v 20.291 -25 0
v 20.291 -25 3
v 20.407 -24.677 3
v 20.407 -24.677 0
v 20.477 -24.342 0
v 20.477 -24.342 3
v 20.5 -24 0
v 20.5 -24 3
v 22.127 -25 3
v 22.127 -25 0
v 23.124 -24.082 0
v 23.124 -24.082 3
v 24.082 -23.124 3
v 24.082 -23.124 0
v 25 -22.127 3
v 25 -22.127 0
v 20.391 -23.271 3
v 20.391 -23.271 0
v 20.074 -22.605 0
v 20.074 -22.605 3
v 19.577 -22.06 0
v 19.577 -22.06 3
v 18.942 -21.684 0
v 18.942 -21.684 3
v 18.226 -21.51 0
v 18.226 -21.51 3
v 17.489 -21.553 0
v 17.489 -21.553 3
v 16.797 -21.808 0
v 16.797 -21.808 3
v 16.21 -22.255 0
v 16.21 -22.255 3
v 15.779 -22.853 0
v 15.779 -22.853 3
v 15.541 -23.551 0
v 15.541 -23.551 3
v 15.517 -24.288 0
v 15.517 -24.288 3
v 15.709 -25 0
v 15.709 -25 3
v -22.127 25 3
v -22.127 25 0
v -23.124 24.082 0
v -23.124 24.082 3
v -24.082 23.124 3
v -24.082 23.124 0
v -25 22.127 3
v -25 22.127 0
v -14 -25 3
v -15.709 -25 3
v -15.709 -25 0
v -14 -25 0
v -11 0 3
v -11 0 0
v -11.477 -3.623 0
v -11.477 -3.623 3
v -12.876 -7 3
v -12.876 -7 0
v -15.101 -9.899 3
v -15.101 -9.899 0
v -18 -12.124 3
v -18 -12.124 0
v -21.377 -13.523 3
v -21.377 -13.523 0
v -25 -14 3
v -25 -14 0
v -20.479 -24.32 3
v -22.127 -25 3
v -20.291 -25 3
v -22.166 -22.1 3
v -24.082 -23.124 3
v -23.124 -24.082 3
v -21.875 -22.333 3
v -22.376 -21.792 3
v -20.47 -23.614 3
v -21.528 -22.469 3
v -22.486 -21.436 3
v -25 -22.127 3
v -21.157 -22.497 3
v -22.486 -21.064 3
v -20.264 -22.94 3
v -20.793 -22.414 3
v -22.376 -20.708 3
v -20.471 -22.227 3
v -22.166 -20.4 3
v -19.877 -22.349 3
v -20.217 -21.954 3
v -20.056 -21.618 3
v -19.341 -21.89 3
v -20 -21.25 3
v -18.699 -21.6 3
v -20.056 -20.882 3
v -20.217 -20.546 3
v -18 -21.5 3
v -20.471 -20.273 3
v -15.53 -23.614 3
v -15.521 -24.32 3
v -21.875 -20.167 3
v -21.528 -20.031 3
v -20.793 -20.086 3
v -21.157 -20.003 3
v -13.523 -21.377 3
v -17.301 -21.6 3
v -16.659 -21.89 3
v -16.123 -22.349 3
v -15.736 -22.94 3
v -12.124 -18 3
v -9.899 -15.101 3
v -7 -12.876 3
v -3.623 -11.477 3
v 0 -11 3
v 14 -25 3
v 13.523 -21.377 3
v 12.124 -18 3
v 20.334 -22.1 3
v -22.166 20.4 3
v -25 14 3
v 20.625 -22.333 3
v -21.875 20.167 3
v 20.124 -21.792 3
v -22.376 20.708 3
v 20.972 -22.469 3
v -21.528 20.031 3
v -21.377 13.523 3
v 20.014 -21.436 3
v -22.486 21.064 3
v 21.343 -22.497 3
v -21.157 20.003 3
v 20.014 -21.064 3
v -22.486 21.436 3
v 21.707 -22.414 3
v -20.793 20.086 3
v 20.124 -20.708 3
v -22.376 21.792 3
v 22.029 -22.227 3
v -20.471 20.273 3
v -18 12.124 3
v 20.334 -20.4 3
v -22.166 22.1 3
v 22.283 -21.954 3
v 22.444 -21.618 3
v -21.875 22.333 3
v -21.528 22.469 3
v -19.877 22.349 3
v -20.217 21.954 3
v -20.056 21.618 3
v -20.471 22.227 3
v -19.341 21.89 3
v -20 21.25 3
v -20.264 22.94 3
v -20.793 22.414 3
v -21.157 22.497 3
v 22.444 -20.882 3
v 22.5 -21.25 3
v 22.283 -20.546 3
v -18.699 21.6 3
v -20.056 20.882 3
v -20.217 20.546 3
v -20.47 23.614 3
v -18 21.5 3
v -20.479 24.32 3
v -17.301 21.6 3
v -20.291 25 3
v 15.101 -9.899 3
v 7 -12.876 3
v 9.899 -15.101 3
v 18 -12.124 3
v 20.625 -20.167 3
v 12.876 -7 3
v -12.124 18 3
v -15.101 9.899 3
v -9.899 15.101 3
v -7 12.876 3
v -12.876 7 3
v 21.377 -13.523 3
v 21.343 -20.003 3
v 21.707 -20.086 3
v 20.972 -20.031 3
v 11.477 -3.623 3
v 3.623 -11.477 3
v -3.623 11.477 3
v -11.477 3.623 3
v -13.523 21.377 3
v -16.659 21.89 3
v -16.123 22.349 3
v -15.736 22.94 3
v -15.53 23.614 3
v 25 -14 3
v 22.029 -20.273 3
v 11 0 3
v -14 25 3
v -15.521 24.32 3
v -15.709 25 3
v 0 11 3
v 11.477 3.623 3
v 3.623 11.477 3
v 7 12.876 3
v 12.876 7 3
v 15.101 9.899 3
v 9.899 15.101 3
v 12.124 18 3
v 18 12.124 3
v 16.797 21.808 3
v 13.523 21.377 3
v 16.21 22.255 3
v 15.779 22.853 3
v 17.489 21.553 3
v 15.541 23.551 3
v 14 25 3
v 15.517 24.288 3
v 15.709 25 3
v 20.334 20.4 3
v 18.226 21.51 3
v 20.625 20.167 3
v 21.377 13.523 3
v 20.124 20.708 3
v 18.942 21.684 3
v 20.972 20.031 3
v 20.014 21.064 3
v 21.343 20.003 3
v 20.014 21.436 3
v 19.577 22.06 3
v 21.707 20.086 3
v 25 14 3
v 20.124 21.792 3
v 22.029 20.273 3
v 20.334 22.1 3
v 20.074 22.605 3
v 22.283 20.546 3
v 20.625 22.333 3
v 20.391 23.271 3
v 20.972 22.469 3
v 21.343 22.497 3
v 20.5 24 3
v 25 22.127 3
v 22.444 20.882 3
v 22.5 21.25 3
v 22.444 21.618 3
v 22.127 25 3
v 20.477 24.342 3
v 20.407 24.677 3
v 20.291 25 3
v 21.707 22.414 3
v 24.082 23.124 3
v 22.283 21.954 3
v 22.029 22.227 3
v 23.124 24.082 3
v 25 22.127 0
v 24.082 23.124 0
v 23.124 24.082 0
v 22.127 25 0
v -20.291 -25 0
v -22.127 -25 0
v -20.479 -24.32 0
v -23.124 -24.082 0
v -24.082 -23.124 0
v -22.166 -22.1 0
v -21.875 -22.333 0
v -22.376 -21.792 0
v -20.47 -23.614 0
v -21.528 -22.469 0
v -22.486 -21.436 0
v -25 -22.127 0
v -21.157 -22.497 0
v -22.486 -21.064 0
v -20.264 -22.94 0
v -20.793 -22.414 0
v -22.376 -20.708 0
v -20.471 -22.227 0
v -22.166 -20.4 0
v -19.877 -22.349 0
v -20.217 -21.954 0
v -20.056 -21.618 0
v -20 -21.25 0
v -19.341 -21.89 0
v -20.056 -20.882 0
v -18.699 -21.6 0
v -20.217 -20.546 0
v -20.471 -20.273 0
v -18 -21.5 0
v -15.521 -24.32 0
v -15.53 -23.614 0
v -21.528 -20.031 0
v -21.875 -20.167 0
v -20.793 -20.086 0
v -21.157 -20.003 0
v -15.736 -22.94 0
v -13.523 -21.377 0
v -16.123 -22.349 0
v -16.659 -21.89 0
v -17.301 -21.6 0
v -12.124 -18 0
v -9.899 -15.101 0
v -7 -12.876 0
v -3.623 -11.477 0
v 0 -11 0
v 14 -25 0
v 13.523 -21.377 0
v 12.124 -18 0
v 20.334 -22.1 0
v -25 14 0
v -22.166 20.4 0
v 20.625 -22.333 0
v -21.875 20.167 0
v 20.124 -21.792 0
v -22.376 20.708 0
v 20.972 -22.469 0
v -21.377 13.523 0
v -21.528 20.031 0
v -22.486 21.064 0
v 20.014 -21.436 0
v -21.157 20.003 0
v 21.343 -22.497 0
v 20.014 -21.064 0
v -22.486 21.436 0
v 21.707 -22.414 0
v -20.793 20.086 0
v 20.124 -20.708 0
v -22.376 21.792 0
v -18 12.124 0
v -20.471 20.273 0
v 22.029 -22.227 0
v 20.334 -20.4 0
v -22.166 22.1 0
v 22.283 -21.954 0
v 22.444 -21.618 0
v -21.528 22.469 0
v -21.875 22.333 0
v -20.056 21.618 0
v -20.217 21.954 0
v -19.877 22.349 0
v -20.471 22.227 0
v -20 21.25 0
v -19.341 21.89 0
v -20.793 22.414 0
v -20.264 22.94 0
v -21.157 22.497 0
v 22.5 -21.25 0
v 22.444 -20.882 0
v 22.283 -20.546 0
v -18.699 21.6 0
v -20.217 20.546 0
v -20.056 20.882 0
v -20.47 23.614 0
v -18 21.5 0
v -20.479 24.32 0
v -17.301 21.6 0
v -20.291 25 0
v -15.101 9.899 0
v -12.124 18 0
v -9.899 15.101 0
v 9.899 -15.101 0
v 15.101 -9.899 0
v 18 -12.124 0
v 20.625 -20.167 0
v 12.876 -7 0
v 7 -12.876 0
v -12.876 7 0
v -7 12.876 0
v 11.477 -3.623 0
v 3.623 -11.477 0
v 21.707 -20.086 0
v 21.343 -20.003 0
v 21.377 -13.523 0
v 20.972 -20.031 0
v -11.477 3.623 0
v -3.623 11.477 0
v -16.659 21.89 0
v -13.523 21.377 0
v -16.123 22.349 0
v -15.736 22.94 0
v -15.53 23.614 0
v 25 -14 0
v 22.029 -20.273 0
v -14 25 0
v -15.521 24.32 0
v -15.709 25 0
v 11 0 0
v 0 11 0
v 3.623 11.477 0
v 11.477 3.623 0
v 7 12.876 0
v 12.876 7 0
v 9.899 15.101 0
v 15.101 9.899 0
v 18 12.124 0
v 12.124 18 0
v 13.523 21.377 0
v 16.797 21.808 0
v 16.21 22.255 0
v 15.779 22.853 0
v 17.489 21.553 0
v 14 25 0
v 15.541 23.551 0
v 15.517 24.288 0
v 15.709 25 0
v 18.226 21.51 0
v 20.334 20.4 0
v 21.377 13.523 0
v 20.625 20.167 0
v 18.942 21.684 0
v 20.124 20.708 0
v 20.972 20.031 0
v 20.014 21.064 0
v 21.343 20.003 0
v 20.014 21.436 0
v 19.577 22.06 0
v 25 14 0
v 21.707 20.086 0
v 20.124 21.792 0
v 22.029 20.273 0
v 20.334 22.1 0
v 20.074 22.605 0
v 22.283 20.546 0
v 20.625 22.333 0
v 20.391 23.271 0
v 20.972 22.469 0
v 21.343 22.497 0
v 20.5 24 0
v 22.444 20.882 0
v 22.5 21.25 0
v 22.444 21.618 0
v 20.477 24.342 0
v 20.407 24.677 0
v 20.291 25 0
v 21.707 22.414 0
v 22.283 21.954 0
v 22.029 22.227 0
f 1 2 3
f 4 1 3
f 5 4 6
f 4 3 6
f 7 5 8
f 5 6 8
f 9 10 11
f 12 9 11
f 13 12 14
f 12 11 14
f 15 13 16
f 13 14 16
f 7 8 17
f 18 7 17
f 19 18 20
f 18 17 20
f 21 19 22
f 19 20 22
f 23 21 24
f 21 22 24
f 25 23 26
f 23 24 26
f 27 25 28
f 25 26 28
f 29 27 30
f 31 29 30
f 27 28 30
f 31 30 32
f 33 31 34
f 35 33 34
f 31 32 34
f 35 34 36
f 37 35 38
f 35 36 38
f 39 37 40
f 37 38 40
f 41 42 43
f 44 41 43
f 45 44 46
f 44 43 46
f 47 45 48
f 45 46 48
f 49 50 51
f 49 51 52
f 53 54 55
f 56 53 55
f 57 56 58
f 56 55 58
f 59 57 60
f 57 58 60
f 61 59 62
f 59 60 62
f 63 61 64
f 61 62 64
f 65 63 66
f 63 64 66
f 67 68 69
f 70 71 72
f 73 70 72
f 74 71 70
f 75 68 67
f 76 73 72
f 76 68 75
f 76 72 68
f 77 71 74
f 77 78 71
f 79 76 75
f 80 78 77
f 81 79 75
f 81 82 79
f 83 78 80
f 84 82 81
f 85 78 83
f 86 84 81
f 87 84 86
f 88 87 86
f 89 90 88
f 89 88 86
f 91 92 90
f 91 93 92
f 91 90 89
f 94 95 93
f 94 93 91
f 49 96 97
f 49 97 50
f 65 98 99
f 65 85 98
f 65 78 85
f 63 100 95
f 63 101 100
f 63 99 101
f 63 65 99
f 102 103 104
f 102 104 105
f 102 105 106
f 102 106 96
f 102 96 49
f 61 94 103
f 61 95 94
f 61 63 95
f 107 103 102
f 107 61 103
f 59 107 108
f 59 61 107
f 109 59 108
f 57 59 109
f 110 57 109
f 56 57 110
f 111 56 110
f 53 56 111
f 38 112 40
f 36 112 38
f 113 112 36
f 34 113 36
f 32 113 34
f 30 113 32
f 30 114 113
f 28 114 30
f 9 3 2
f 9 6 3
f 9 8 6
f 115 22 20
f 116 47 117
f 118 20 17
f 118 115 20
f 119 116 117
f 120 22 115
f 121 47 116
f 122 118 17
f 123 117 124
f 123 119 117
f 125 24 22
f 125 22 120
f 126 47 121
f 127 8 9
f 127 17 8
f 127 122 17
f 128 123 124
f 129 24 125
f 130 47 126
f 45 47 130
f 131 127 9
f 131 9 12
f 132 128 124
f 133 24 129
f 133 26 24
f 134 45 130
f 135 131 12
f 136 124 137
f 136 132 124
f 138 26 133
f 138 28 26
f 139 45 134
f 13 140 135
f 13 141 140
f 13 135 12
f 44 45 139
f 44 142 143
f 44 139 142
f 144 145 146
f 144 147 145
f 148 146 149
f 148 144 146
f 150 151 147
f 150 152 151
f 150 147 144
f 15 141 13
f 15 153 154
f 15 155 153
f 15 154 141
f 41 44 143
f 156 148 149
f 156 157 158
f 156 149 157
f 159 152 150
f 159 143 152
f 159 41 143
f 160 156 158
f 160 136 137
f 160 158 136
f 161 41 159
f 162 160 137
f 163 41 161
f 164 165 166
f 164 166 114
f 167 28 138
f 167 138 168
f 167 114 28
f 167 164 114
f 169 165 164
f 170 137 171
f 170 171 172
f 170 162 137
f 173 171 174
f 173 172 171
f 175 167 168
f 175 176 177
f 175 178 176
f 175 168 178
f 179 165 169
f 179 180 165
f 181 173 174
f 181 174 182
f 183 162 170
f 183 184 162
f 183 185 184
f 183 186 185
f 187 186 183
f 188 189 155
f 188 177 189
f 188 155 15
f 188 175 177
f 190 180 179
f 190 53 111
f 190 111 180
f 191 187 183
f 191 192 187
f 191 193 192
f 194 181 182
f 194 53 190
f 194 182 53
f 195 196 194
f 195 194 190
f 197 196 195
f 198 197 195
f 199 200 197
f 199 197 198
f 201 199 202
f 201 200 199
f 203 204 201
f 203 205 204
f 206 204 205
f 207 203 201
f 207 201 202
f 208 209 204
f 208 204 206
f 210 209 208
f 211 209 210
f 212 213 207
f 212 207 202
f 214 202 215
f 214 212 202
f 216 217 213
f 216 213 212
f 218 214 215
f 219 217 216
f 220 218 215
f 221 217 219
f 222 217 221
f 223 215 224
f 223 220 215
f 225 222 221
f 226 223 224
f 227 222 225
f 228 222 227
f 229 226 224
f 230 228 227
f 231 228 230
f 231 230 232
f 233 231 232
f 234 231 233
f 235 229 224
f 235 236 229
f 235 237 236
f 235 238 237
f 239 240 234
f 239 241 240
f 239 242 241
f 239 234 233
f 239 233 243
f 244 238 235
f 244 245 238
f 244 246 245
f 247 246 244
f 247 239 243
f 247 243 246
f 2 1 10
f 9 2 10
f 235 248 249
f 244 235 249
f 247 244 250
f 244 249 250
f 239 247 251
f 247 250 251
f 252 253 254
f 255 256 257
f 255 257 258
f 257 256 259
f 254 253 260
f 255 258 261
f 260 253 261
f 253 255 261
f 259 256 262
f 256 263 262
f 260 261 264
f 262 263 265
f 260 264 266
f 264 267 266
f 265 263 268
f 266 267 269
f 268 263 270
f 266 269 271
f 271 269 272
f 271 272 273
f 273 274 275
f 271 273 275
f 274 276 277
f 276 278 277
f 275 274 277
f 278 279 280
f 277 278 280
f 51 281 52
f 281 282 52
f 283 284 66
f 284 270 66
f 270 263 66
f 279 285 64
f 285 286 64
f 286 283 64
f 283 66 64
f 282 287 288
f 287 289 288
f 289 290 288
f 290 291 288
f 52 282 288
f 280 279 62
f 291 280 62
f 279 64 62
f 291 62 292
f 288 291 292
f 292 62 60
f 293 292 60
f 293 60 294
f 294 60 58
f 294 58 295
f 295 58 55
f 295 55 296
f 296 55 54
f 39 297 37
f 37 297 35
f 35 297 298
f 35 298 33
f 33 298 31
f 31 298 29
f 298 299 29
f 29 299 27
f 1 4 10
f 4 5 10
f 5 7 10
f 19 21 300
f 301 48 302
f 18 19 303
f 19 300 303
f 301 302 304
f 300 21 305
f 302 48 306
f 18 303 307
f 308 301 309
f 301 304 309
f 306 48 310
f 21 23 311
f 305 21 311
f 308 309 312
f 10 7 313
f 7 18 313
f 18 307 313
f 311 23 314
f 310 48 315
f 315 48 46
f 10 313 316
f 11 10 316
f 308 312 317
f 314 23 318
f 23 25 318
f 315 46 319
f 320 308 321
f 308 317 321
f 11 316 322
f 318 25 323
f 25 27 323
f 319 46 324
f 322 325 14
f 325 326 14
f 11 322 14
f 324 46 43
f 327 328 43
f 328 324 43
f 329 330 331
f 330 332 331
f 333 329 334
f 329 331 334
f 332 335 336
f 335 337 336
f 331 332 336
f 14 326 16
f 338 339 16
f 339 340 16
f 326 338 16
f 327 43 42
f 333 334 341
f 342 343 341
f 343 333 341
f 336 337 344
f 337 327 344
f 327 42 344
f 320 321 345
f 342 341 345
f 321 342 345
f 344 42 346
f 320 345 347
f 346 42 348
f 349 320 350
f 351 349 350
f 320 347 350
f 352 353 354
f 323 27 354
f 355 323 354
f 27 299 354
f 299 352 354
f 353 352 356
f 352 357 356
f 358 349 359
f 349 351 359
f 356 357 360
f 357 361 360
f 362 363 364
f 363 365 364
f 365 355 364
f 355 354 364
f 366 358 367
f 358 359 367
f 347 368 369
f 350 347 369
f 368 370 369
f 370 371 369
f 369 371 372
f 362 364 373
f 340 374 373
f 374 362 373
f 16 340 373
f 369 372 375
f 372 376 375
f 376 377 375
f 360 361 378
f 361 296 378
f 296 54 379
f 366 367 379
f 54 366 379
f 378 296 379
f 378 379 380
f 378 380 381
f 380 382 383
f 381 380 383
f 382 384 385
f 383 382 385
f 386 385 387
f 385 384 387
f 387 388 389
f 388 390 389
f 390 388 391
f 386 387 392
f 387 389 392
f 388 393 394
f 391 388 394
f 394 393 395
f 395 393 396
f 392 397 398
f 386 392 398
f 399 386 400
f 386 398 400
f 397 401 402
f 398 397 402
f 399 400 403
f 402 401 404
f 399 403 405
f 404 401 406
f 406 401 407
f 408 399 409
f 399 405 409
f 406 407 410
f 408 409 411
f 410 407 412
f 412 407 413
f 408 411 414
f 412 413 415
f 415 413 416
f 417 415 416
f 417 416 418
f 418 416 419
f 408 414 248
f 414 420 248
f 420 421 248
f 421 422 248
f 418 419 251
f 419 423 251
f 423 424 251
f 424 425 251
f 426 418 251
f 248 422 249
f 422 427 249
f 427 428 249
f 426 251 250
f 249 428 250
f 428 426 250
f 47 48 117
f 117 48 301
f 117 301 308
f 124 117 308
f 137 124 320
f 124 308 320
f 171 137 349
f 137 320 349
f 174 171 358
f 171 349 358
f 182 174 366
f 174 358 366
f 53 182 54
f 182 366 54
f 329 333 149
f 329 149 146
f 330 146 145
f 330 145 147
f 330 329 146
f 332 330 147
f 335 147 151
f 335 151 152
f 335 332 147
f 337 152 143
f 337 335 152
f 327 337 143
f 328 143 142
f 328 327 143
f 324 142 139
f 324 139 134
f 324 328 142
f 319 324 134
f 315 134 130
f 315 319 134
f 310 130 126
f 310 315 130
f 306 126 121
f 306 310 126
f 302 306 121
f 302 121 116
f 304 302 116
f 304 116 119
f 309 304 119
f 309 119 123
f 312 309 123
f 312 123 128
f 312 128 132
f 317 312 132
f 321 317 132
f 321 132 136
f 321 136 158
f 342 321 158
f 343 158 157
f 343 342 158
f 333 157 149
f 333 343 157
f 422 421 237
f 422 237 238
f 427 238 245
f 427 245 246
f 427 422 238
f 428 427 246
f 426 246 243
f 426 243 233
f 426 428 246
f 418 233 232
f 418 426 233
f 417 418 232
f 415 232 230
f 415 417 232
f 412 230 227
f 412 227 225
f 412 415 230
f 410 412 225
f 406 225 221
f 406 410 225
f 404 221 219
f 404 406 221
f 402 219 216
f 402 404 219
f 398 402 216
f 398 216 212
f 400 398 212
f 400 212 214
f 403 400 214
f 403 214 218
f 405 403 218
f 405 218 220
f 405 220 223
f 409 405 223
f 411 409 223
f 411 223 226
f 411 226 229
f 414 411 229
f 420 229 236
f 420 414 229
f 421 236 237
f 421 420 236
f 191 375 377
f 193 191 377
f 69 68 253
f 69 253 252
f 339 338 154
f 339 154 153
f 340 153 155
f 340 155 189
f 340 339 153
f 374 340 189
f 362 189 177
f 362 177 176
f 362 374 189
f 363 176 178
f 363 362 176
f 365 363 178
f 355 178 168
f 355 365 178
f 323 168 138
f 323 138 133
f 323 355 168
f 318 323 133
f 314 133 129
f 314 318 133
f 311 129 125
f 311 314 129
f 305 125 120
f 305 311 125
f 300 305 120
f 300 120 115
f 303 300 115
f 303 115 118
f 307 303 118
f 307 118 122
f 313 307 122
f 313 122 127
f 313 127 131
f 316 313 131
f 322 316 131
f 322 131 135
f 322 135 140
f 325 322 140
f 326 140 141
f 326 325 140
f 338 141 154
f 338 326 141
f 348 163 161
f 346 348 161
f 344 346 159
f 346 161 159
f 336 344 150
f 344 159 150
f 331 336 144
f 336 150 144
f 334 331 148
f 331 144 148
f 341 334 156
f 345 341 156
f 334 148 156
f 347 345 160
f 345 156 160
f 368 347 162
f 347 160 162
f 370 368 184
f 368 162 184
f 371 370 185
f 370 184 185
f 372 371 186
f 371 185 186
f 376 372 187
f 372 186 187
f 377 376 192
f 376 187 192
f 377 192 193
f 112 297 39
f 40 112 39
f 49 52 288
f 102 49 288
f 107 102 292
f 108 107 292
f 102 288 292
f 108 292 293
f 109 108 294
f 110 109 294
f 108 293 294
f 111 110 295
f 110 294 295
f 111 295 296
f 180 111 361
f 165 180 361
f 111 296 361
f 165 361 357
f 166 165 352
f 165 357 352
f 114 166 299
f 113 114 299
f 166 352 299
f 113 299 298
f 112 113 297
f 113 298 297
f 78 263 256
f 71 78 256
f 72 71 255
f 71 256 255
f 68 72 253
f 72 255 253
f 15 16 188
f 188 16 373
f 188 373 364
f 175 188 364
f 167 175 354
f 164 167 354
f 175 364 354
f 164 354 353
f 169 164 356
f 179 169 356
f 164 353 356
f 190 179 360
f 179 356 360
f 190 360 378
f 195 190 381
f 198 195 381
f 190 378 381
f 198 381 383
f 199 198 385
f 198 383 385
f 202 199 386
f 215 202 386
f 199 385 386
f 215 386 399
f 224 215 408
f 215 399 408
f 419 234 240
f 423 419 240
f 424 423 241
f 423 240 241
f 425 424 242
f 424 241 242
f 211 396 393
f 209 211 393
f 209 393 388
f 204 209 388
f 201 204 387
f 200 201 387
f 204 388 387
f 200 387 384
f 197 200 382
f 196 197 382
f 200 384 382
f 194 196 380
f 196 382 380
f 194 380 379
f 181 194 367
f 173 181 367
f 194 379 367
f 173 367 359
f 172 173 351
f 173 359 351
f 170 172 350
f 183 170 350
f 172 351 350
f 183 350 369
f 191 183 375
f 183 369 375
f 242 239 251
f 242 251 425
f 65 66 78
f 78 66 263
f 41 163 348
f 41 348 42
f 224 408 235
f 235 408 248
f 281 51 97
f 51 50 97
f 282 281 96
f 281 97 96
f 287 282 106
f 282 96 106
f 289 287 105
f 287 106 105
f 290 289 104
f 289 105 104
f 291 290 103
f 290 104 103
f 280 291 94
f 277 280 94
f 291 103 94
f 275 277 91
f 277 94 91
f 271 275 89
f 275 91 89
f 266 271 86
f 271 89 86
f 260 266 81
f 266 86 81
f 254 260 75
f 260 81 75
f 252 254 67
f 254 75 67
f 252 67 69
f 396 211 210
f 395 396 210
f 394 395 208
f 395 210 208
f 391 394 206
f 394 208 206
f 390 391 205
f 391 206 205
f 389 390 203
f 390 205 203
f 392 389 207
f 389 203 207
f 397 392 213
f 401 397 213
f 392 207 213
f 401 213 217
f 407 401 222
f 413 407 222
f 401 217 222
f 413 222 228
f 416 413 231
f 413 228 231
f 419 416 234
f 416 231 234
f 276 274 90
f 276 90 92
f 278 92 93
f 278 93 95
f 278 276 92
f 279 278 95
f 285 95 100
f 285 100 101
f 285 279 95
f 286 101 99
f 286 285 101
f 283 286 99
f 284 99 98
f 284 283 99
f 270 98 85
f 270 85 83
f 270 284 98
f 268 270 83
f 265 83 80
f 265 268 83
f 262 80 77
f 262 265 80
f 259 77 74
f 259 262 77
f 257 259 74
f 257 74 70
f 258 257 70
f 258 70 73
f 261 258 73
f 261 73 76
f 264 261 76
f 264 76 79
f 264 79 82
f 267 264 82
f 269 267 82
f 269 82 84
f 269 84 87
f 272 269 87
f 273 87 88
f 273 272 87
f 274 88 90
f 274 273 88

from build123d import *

# Parameters (mm, degrees)
SKETCH_1_R          = 1.25
EXTRUDE_1_DEPTH     = 3
SKETCH_2_R          = 2.5
CUT_EXTRUDE_1_DEPTH = 12


with BuildPart() as part:
    # 草图1 → 凸台-拉伸1 (new body)
    with BuildSketch(Plane.XY):
        with BuildLine():
            Line((-14, 25), (-22.127465978, 25))
            ThreePointArc((-22.127465978, 25), (-23.607464398, 23.607464398), (-25, 22.127465978))
            Line((-25, 22.127465978), (-25, 14))
            ThreePointArc((-25, 14), (-15.100505063, 9.899494937), (-11, 0))
            ThreePointArc((-11, 0), (-15.100505063, -9.899494937), (-25, -14))
            Line((-25, -14), (-25, -22.127465978))
            ThreePointArc((-25, -22.127465978), (-23.607464398, -23.607464398), (-22.127465978, -25))
            Line((-22.127465978, -25), (-14, -25))
            ThreePointArc((-14, -25), (0, -11), (14, -25))
            Line((14, -25), (22.127465978, -25))
            ThreePointArc((22.127465978, -25), (23.607464398, -23.607464398), (25, -22.127465978))
            Line((25, -22.127465978), (25, -14))
            ThreePointArc((25, -14), (11, 0), (25, 14))
            Line((25, 14), (25, 22.127465978))
            ThreePointArc((25, 22.127465978), (23.607464398, 23.607464398), (22.127465978, 25))
            Line((22.127465978, 25), (14, 25))
            ThreePointArc((14, 25), (0, 11), (-14, 25))
        make_face()
        with Locations((-21.25, -21.25)):
            Circle(SKETCH_1_R, mode=Mode.SUBTRACT)
        with Locations((21.25, -21.25)):
            Circle(SKETCH_1_R, mode=Mode.SUBTRACT)
        with Locations((-21.25, 21.25)):
            Circle(SKETCH_1_R, mode=Mode.SUBTRACT)
        with Locations((21.25, 21.25)):
            Circle(SKETCH_1_R, mode=Mode.SUBTRACT)
    extrude(amount=EXTRUDE_1_DEPTH)

    # 草图2 → 切除-拉伸1 (cut)
    with BuildSketch(Plane.XY.offset(3)):
        with BuildLine():
            ThreePointArc((20.291287847, 25), (18, 26.5), (15.708712153, 25))
            Line((15.708712153, 25), (20.291287847, 25))
        make_face()
        with BuildLine():
            Line((20.291287847, 25), (15.708712153, 25))
            ThreePointArc((15.708712153, 25), (17.489225891, 21.552734218), (20.5, 24))
            ThreePointArc((20.5, 24), (20.447265782, 24.510774109), (20.291287847, 25))
        make_face()
        with BuildLine():
            ThreePointArc((20.5, -24), (17.489225891, -21.552734218), (15.708712153, -25))
            Line((15.708712153, -25), (20.291287847, -25))
            ThreePointArc((20.291287847, -25), (20.447265782, -24.510774109), (20.5, -24))
        make_face()
        with BuildLine():
            Line((20.291287847, -25), (15.708712153, -25))
            ThreePointArc((15.708712153, -25), (18, -26.5), (20.291287847, -25))
        make_face()
        with Locations((-18, 24)):
            Circle(SKETCH_2_R)
        with Locations((-18, -24)):
            Circle(SKETCH_2_R)
    extrude(amount=-CUT_EXTRUDE_1_DEPTH, mode=Mode.SUBTRACT)


solid = part.part
